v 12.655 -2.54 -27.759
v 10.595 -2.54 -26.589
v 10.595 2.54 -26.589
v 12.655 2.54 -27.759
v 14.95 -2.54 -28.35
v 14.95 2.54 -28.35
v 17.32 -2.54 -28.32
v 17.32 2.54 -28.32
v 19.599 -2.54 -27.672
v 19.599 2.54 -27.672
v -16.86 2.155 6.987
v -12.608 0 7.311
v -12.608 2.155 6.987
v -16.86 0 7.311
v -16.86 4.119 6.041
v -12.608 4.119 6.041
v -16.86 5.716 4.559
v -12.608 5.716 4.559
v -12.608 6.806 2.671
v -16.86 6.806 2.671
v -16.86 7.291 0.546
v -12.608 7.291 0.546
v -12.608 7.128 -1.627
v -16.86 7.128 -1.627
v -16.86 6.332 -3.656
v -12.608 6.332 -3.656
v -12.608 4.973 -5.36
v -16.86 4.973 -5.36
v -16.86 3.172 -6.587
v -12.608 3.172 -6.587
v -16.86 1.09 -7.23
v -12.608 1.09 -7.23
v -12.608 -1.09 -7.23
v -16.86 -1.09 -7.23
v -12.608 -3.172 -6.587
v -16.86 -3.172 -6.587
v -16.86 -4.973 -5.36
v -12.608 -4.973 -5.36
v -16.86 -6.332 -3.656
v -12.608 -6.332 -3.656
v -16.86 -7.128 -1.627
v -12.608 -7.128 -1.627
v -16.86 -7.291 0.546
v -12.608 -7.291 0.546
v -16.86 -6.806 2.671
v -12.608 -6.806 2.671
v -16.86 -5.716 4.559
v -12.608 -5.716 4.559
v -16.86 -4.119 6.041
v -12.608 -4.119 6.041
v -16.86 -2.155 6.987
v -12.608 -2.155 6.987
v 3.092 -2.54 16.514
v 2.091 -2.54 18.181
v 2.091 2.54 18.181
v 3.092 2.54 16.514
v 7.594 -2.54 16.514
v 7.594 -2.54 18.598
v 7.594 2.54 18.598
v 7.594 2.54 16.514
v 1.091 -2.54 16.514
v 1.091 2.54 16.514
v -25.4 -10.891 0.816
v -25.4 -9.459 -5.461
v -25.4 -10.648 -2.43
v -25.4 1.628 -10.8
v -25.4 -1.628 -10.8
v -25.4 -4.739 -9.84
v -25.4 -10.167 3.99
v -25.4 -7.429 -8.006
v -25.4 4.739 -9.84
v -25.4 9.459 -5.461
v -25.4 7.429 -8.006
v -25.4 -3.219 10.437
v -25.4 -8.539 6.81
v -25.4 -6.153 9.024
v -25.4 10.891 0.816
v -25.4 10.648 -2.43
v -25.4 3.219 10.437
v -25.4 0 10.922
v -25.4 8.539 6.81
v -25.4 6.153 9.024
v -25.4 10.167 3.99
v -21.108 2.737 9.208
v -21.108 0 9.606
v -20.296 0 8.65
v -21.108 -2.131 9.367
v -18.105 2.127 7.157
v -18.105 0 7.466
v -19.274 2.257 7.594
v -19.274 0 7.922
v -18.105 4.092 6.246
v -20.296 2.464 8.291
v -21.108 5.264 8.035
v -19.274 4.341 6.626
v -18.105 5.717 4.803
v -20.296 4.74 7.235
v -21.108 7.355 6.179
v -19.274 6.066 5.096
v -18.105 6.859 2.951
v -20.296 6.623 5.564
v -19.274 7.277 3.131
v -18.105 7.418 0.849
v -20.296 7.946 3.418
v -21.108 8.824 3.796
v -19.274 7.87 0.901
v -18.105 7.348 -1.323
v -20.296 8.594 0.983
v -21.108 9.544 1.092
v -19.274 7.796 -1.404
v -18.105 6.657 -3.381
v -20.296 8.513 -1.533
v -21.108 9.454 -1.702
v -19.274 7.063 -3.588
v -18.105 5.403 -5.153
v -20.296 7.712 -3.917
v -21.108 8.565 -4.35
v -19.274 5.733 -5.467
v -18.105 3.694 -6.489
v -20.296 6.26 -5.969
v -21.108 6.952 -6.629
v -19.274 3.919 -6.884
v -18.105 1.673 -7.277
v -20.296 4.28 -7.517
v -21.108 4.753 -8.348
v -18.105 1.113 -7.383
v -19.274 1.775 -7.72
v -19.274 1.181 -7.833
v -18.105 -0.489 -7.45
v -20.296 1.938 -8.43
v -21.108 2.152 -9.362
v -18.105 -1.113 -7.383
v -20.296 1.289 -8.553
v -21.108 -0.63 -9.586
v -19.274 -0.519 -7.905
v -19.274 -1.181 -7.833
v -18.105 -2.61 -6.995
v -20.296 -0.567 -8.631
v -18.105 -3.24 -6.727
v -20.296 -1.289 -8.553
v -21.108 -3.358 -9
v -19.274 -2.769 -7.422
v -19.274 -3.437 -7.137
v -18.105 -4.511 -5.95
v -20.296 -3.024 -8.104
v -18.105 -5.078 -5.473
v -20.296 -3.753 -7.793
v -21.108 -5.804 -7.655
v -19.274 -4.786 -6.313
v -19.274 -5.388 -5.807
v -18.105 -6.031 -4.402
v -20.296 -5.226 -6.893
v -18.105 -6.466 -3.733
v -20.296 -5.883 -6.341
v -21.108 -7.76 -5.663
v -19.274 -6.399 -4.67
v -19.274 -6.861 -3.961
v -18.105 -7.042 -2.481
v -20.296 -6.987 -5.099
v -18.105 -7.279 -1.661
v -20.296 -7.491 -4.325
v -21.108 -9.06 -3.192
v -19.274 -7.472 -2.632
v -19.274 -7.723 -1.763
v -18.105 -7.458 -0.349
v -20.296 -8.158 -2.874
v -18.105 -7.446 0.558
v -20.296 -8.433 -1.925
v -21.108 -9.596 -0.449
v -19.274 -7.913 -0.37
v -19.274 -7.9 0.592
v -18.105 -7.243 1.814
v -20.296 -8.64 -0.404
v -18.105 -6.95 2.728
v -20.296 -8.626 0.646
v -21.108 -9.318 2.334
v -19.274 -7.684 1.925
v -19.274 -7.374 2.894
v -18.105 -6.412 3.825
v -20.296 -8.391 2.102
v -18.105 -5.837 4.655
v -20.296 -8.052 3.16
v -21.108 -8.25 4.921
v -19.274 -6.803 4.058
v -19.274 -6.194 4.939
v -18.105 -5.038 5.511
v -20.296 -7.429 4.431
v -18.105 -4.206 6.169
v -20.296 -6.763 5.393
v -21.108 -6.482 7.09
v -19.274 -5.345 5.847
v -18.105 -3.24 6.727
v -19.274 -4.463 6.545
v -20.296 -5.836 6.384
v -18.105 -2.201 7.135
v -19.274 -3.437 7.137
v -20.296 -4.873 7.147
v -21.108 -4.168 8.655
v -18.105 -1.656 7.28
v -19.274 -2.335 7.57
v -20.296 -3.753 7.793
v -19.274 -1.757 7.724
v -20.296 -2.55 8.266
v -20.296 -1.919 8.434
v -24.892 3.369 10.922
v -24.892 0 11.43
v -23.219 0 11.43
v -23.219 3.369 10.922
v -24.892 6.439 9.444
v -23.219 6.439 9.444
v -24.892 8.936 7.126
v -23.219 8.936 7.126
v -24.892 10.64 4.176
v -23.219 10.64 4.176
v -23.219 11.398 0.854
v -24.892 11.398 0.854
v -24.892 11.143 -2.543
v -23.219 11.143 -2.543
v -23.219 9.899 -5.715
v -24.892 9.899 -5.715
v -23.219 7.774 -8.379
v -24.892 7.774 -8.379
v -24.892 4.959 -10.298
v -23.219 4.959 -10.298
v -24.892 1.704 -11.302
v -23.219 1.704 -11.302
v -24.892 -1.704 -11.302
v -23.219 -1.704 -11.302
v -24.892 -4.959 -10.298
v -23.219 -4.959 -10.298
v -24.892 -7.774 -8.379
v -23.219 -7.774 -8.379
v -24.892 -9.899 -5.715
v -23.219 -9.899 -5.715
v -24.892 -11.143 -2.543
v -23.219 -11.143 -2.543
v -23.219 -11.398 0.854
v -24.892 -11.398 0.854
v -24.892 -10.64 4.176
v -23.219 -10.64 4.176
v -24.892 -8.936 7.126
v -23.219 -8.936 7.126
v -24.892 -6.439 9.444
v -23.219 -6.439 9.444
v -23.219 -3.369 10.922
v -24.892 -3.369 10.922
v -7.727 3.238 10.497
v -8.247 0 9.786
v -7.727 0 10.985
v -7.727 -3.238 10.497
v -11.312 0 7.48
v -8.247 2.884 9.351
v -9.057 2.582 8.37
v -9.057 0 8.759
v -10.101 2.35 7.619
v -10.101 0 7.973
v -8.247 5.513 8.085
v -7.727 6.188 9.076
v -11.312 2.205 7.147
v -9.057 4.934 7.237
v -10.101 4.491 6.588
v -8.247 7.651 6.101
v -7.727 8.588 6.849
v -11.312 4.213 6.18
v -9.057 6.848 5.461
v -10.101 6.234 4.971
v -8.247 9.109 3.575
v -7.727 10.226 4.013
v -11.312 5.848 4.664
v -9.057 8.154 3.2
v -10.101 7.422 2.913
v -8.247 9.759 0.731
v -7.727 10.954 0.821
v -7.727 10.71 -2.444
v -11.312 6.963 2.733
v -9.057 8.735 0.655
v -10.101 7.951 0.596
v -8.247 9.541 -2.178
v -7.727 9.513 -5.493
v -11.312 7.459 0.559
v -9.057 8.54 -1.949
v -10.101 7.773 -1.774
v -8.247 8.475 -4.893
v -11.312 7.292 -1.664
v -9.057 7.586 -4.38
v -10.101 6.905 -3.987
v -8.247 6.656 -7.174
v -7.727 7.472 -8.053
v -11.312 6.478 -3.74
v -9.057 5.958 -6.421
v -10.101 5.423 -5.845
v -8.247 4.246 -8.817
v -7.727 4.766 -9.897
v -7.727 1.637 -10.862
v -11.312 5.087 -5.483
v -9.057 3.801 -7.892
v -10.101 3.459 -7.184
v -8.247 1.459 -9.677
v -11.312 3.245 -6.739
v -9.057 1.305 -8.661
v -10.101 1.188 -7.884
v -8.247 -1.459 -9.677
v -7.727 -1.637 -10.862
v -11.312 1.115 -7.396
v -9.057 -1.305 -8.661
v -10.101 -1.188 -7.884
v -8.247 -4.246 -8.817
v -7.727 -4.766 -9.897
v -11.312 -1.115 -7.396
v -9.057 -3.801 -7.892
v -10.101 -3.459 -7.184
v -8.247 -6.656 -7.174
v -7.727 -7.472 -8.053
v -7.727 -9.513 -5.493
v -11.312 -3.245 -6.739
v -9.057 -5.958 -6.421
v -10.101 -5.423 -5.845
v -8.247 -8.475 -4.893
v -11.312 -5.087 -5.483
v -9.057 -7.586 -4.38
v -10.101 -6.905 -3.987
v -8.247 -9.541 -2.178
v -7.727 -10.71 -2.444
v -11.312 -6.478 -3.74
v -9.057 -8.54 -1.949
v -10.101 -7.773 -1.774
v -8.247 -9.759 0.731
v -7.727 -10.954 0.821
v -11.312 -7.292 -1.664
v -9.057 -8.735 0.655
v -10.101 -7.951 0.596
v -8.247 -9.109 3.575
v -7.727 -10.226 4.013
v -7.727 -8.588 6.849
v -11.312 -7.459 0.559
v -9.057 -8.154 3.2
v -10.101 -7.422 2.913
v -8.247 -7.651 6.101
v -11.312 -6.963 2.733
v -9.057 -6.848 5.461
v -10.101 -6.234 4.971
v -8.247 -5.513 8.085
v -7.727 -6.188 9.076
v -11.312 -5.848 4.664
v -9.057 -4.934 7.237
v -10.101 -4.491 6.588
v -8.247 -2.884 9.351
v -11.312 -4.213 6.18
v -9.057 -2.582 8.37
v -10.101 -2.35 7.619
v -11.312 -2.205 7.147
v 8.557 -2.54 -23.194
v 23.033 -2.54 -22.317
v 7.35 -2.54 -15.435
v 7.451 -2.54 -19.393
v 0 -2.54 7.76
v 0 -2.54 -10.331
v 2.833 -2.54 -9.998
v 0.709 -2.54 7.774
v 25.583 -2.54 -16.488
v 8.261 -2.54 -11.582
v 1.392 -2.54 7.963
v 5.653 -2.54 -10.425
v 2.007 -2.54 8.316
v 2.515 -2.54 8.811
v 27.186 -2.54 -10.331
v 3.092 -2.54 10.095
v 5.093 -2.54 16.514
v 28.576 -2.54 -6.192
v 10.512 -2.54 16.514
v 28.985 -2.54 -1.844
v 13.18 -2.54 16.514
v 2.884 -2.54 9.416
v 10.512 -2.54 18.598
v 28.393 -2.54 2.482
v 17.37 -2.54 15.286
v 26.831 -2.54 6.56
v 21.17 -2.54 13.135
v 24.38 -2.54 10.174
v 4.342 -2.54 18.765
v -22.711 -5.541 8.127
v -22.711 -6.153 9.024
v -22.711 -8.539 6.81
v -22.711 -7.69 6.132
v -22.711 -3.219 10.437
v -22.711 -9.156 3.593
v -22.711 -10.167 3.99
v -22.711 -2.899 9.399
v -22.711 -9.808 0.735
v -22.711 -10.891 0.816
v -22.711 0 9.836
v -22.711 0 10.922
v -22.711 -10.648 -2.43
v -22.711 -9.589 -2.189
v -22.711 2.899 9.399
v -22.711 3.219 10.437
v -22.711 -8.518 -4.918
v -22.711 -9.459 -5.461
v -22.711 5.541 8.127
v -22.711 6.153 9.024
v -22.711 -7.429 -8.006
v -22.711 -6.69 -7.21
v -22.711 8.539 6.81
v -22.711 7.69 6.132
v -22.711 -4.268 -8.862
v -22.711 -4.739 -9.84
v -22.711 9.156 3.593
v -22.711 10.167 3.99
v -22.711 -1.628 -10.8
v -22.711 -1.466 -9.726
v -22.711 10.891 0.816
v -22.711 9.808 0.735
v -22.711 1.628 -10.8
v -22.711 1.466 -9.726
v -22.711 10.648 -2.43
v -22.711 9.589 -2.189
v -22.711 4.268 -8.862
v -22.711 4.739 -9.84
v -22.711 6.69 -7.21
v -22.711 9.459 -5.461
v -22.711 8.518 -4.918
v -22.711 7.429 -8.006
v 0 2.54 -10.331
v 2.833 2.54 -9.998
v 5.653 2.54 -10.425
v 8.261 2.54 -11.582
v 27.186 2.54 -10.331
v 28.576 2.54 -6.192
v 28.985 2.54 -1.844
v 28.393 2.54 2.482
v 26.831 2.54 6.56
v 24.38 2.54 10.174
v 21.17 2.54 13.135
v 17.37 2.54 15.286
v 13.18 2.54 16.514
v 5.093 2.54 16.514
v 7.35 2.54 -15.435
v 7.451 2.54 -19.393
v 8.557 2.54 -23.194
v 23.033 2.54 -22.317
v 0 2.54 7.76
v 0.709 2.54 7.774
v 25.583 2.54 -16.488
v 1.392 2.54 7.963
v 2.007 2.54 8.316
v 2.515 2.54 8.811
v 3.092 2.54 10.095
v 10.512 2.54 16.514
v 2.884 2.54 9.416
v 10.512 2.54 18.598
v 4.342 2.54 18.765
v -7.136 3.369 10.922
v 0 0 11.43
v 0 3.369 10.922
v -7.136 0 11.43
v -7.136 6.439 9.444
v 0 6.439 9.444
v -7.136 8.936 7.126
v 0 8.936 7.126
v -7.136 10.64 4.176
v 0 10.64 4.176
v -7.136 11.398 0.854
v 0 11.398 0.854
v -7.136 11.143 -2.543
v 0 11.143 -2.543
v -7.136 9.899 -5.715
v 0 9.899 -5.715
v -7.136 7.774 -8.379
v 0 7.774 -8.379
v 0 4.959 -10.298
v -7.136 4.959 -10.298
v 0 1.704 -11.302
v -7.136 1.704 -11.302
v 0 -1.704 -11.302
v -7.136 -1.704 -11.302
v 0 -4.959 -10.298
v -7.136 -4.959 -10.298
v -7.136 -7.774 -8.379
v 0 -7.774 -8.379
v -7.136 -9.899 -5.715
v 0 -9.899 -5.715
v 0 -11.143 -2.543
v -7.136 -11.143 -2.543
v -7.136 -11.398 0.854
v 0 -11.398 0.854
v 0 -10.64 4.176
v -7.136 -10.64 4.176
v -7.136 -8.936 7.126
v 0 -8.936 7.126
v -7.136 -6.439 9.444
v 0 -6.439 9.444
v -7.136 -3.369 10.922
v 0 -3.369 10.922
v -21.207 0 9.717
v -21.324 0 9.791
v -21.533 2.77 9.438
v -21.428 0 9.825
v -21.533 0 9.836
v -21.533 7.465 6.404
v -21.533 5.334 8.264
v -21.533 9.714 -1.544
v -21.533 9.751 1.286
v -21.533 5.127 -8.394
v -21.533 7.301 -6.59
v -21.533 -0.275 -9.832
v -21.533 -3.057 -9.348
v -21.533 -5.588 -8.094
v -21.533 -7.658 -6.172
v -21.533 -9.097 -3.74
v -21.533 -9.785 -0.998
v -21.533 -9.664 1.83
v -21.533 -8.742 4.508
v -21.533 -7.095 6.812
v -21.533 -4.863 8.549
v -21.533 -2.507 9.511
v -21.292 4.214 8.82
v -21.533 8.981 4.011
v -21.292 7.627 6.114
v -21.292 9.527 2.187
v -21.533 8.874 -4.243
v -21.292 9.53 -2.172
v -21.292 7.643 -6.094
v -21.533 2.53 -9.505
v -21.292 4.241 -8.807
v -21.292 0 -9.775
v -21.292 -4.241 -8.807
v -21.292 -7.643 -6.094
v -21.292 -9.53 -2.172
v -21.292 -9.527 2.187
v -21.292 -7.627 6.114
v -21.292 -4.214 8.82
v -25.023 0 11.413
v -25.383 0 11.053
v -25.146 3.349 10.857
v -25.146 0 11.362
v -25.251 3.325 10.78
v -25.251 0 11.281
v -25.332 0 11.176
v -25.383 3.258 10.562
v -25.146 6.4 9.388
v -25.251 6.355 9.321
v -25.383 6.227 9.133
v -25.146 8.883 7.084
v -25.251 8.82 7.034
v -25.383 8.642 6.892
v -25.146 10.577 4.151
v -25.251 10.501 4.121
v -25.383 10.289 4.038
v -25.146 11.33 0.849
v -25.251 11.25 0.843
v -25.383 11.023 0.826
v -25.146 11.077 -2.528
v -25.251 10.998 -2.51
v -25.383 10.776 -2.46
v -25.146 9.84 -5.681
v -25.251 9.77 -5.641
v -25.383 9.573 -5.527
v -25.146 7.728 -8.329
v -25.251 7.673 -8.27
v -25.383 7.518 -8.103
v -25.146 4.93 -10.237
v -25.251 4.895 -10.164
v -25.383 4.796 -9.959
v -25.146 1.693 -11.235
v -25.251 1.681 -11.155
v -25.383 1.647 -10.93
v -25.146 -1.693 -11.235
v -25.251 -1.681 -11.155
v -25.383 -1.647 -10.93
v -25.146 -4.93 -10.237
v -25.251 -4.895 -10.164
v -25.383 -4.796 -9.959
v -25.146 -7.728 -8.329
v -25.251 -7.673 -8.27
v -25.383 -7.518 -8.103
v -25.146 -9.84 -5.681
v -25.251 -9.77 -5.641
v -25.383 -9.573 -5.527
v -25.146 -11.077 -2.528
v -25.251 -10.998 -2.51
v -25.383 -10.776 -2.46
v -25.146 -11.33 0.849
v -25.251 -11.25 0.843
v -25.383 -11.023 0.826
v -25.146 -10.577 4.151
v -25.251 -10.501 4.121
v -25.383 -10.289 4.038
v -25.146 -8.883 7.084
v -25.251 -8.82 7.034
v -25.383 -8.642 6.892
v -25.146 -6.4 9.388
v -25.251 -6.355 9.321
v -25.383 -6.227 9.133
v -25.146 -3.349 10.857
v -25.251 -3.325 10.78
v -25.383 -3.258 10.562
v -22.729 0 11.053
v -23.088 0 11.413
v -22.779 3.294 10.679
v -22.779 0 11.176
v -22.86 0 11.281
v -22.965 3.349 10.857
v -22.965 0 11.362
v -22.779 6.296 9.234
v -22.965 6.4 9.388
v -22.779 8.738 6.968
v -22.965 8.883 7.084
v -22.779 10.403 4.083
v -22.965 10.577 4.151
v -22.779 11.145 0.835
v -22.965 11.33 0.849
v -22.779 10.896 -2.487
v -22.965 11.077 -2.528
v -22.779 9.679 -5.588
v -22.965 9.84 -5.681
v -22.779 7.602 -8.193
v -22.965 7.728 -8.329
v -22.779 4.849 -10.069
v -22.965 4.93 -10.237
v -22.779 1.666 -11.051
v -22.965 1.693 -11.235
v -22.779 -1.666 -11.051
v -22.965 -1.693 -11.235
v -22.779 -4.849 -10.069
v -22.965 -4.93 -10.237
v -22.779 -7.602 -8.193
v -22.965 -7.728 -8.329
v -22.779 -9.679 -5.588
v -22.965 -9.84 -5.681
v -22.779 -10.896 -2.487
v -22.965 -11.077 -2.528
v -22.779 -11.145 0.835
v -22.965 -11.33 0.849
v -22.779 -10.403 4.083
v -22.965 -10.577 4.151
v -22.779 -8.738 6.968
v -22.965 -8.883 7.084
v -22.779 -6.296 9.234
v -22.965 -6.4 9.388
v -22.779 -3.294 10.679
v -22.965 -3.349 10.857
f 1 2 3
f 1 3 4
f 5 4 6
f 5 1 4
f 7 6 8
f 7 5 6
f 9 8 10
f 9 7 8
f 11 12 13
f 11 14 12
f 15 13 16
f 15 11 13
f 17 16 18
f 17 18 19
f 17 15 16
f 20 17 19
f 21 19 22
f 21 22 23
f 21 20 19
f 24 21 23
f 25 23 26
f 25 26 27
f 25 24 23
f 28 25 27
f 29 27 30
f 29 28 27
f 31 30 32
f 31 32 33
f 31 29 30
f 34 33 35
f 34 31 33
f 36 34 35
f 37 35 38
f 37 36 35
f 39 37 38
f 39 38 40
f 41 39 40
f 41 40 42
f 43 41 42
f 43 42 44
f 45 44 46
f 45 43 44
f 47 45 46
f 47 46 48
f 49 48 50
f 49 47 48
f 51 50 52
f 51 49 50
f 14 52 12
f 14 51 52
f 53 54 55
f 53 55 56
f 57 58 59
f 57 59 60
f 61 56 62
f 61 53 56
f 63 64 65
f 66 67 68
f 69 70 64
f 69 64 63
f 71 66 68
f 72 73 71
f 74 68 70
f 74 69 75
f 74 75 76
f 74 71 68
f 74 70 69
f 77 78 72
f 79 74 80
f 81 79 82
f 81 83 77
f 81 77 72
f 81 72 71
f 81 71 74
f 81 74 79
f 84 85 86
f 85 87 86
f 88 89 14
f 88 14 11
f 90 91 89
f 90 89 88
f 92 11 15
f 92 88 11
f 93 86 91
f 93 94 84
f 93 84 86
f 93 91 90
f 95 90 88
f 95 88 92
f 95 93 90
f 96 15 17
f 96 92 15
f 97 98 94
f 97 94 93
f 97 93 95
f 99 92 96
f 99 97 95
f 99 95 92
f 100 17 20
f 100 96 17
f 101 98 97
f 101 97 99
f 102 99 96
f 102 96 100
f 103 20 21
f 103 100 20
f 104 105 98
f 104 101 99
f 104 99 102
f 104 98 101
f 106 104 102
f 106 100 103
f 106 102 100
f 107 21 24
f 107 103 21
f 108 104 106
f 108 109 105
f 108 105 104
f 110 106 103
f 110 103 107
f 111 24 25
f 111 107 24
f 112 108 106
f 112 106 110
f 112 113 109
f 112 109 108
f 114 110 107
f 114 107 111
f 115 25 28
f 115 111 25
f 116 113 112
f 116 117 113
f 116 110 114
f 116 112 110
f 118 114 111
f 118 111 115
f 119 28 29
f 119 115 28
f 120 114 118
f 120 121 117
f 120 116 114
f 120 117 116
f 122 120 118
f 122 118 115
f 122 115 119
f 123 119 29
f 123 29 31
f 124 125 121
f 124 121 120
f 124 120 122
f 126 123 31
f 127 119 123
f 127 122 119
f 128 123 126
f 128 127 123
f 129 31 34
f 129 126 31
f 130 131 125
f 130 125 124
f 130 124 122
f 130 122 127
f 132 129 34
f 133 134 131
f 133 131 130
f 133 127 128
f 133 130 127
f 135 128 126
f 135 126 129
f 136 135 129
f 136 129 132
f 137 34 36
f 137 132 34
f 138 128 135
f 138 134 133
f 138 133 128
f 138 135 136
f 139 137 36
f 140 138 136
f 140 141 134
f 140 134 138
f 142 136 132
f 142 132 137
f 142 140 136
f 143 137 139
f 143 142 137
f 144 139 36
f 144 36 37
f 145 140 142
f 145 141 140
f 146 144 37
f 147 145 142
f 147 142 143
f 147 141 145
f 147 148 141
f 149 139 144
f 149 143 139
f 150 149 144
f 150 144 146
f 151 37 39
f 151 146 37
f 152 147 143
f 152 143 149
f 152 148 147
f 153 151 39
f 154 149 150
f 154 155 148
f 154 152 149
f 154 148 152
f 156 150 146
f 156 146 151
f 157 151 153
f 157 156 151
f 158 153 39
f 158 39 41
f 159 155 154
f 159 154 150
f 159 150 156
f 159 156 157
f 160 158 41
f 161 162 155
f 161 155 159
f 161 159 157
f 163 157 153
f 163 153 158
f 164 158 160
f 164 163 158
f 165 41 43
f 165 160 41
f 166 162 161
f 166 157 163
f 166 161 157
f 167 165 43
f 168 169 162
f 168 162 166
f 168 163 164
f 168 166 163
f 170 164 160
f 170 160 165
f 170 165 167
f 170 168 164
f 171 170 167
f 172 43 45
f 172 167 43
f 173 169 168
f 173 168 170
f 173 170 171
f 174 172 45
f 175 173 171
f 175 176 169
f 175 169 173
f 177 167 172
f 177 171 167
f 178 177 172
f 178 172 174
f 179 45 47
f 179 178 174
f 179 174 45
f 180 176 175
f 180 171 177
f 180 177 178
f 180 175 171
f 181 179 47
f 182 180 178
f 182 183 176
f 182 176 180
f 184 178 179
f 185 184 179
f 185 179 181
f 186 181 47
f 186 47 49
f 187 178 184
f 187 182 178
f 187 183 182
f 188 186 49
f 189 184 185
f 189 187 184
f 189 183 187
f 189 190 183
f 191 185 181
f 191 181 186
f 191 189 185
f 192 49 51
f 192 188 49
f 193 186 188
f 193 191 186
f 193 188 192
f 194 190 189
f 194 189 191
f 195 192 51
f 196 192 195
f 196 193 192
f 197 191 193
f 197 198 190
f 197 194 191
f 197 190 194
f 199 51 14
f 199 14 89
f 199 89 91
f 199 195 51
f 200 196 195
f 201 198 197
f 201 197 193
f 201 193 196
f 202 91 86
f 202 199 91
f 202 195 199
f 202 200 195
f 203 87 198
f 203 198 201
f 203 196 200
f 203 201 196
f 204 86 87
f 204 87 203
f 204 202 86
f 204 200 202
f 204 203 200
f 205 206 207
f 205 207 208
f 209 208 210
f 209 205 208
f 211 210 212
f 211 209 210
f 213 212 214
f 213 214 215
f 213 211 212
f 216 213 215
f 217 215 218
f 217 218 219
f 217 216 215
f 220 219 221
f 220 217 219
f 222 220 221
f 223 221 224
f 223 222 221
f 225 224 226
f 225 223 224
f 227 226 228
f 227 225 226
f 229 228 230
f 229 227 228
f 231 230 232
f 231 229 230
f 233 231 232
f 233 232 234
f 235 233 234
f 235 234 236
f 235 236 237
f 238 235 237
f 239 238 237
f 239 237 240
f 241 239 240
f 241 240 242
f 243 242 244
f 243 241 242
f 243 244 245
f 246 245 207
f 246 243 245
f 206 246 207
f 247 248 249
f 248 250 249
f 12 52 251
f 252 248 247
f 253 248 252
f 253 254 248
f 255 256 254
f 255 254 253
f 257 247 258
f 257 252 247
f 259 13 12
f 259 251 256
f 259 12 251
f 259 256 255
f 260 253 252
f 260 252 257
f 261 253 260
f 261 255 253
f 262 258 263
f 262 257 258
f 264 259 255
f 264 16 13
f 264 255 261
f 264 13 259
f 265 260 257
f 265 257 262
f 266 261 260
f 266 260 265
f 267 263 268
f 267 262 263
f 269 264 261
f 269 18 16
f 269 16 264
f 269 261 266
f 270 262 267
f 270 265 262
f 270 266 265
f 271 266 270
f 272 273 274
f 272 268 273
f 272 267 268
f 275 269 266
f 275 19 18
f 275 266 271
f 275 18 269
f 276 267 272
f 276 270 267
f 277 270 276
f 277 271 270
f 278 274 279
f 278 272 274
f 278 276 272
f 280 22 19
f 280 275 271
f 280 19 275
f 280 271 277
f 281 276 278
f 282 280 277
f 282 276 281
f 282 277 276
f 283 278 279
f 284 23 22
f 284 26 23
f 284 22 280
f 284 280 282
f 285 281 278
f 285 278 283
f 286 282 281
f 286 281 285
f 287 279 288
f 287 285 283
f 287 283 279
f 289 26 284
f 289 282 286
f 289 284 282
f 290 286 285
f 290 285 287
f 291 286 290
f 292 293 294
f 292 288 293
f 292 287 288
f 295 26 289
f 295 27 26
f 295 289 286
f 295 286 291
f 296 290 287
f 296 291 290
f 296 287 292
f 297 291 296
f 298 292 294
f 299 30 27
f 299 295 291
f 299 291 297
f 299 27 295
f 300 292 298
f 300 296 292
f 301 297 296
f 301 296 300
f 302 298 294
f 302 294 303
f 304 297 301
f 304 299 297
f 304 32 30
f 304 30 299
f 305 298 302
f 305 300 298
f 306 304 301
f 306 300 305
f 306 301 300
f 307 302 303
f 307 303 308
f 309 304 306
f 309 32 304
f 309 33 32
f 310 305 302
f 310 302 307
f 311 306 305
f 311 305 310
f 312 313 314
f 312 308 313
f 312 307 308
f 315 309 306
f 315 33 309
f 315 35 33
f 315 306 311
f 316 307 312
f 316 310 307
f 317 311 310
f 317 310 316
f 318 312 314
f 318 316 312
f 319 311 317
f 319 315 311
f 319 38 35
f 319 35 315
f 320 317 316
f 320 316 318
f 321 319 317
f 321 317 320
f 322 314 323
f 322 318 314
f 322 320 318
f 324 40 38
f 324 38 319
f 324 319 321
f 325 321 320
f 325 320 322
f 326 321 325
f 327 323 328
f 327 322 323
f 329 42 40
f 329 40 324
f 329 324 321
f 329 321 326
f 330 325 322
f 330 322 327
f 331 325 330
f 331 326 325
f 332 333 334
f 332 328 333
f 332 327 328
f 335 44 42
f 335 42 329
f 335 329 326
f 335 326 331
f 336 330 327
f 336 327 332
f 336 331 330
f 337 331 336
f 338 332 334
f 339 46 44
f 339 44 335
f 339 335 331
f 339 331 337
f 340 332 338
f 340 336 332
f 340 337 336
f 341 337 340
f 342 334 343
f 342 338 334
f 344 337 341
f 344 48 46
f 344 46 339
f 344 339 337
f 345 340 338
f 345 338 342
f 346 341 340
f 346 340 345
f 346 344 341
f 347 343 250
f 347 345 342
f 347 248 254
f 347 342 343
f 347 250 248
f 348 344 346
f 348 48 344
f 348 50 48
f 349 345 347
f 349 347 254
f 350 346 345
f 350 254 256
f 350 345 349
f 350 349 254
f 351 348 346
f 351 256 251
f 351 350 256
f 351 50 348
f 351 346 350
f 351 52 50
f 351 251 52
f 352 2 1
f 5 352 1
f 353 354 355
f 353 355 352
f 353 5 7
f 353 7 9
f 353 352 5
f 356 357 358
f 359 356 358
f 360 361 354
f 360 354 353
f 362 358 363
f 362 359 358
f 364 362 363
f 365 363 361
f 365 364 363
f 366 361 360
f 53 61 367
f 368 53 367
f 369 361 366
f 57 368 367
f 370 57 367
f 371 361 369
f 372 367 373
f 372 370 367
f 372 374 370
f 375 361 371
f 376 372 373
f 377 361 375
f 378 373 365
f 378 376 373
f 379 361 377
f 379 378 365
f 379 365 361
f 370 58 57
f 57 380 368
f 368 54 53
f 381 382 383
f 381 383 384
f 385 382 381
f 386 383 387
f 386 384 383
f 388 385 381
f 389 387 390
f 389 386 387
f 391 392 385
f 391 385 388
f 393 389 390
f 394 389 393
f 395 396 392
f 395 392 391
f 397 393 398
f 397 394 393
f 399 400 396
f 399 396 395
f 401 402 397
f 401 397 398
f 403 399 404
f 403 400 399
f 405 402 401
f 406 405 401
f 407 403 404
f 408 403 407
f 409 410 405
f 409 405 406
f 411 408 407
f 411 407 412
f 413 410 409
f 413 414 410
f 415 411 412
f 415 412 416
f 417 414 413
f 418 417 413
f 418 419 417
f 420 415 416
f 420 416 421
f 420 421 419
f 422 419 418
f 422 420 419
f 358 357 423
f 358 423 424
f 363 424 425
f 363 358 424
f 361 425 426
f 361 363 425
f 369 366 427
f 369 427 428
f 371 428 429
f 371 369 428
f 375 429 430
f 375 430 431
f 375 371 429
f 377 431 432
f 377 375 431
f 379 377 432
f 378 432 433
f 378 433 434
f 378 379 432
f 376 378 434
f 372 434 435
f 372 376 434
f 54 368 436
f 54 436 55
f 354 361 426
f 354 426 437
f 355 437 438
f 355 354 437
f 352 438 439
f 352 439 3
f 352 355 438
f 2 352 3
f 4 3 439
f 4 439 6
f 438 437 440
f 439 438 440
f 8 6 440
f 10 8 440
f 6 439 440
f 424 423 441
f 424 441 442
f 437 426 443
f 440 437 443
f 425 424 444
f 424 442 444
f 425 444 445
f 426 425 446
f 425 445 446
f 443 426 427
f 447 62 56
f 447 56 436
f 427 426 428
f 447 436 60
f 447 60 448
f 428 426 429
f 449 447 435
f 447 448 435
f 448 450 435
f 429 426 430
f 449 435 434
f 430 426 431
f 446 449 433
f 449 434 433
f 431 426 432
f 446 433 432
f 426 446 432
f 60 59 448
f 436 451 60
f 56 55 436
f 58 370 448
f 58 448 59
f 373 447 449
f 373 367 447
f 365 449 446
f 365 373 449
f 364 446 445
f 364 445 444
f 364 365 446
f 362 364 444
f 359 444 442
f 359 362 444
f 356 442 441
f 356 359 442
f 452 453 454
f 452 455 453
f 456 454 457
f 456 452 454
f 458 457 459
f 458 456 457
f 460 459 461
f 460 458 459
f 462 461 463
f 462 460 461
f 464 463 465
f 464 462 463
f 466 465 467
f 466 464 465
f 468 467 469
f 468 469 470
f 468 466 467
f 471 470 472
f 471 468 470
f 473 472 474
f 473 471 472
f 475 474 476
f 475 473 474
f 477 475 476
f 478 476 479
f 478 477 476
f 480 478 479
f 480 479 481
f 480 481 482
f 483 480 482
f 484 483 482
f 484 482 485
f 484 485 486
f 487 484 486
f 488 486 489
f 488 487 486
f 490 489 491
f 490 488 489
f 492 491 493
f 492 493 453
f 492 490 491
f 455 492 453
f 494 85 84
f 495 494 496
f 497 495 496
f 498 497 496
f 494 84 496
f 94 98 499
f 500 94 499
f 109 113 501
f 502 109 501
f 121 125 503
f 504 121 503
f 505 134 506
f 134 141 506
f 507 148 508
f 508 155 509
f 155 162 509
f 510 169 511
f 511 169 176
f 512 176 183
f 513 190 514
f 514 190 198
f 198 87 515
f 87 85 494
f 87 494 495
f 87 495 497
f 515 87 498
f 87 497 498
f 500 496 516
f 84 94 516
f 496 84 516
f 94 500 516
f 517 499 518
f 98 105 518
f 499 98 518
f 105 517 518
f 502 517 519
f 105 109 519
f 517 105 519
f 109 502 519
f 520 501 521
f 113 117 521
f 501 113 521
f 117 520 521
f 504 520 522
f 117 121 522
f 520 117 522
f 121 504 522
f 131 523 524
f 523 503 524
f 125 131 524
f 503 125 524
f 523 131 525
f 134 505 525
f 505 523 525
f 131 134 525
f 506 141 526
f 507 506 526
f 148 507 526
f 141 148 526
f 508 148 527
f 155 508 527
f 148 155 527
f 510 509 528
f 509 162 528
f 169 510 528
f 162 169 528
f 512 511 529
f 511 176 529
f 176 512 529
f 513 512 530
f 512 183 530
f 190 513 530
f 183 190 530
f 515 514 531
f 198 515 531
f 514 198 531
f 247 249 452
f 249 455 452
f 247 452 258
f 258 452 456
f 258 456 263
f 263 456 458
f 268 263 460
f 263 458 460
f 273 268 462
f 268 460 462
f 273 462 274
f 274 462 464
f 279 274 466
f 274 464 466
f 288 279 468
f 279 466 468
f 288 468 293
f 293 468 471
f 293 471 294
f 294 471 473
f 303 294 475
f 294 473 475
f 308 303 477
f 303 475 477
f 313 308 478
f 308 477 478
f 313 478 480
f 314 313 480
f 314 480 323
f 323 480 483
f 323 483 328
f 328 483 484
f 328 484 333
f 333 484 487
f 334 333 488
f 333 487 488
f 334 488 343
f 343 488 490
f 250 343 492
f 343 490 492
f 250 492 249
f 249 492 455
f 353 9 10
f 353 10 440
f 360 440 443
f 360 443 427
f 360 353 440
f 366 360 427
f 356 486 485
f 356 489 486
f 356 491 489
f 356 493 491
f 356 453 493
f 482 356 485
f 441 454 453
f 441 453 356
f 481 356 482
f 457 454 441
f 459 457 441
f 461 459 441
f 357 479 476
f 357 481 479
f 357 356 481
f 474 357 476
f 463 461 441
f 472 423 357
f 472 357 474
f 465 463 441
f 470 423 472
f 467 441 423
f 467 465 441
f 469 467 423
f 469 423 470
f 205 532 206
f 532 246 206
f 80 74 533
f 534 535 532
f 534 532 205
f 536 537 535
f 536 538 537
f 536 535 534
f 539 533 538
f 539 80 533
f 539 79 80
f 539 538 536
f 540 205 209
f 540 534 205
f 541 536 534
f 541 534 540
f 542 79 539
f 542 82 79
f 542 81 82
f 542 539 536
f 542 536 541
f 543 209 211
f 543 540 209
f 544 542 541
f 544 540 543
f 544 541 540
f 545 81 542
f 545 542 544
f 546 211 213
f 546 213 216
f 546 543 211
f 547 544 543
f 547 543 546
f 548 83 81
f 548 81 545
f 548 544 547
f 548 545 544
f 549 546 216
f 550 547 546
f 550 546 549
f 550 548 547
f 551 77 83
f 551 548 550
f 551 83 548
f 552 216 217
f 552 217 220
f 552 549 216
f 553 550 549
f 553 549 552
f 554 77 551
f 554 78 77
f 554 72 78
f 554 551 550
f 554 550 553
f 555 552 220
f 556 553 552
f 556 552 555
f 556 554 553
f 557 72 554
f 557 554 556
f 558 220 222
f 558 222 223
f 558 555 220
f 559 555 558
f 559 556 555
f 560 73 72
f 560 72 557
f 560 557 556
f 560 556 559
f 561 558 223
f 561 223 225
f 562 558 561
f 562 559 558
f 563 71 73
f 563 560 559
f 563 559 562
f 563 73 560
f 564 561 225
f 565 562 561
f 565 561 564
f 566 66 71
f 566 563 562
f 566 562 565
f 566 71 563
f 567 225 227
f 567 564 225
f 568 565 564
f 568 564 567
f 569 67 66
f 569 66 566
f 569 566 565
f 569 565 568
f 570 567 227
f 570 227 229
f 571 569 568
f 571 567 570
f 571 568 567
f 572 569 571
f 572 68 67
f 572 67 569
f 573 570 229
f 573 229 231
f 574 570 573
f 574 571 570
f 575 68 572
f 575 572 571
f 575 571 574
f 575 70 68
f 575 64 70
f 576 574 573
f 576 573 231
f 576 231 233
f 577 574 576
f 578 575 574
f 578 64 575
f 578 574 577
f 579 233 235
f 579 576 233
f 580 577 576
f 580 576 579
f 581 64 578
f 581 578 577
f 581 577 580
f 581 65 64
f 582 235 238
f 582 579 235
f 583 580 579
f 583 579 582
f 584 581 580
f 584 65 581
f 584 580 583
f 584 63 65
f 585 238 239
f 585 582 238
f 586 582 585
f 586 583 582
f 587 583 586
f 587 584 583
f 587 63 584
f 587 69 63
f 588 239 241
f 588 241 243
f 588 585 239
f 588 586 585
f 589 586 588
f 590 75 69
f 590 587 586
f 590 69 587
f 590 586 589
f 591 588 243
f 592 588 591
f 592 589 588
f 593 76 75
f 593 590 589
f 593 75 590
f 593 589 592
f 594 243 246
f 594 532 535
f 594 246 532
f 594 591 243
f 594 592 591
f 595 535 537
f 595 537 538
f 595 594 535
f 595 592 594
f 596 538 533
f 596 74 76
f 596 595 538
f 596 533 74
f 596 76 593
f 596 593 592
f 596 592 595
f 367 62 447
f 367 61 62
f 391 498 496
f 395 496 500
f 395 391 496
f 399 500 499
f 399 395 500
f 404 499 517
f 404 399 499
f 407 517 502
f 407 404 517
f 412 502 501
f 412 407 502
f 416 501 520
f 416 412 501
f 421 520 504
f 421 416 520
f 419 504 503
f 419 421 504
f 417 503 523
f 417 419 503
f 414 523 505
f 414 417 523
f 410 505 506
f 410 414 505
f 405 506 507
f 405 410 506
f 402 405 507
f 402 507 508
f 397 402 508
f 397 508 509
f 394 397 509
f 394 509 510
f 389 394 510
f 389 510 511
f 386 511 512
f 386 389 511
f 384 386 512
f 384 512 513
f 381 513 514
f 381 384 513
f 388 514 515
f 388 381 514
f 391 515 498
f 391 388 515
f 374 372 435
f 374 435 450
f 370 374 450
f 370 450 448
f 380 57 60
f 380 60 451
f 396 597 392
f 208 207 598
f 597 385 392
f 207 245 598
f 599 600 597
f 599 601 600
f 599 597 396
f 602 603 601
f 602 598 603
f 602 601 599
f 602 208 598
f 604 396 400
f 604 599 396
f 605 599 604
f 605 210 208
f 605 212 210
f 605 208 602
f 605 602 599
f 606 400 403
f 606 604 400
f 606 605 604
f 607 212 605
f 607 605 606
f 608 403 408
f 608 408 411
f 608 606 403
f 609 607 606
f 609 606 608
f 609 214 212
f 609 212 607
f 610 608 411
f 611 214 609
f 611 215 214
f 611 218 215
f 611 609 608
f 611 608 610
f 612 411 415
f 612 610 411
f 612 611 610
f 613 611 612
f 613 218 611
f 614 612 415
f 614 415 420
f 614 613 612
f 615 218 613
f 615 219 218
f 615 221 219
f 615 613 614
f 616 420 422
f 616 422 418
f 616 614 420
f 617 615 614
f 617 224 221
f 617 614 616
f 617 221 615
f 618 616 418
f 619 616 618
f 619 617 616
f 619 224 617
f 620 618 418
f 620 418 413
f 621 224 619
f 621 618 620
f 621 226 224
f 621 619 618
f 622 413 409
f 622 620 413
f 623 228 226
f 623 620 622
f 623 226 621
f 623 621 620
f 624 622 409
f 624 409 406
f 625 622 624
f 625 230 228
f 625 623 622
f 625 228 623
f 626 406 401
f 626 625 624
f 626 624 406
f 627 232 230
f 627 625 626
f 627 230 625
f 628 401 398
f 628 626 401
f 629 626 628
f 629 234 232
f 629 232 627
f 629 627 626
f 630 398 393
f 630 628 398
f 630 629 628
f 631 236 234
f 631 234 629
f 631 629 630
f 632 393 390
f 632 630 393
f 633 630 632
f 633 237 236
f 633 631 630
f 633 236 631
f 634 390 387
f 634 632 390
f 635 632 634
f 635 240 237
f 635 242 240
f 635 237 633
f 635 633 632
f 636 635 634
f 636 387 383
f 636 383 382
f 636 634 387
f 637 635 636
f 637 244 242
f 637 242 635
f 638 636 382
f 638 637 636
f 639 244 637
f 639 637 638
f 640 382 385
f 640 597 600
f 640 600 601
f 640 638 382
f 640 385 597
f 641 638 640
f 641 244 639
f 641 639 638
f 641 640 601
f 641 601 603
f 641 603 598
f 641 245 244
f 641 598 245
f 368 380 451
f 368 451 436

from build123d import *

# Parameters (mm, degrees)
F4_R     = 0.508
F7_DEPTH = 2.54


# Not quite as in the source:
# - a fillet or chamfer that OpenCascade refuses, or shapes differently, is made with other operations: its cross-section is extruded or revolved along the edge and cut away or added


with BuildPart() as f1:
    # F0 (on Front) → F1 (revolve)
    with BuildSketch(Plane.XZ):
        Polygon((-25.4, 0), (0, 0), (0, 11.43), (-7.62, 11.43), (-7.62, 7.3114731075), (-20.32, 7.3114731075), (-21.2499899719, 9.835730216), (-22.7114037935, 9.835730216), (-22.7114037935, 11.43), (-25.4, 11.43), align=None)
    revolve(axis=Axis((-12.7, 0, 0), (-1, 0, 0)))

    # F2: fillet of radius 5.08 on 1 edges, made by hand

    # F2_s1 → F2_t2 (revolve)
    with BuildSketch(Plane.XZ):
        with BuildLine():
            ThreePointArc((-16.8597077176, 7.3114731075), (-19.3918240371, 7.9875218198), (-21.2499899719, 9.835730216))
            Line((-21.2499899719, 9.835730216), (-20.32, 7.3114731075))
            Line((-20.32, 7.3114731075), (-16.8597077176, 7.3114731075))
        make_face()
    revolve(axis=Axis((-20.32, 0, 0), (-1, 0, 0)))

    # F3: fillet of radius 5.08 on 1 edges, made by hand

    # F3_s1 → F3_t2 (revolve)
    with BuildSketch(Plane.XZ):
        with BuildLine():
            ThreePointArc((-7.62, 11.43), (-9.3738270483, 8.4741600369), (-12.6081829822, 7.3114731075))
            Line((-12.6081829822, 7.3114731075), (-7.62, 7.3114731075))
            Line((-7.62, 7.3114731075), (-7.62, 11.43))
        make_face()
    revolve(axis=Axis((-7.62, 0, 0), (-1, 0, 0)))

    # F4
    f4_edges = [f1.edges().sort_by_distance(p)[0] for p in [
        (-21.24999, 0, -9.83573),
        (-22.711404, 0, -11.43),
        (-25.4, 0, -11.43),
    ]]
    fillet(f4_edges, radius=F4_R)

    # F5: chamfer of 0.508 on 1 edges, made by hand

    # F5_s1 → F5_t2 (revolve, cut)
    with BuildSketch(Plane.XZ):
        with BuildLine():
            Line((-7.7429817287, 10.9728511125), (-7.1192910196, 11.442218632))
            Line((-7.1192910196, 11.442218632), (-7.1192910196, 11.452378632))
            ThreePointArc((-7.1192910196, 11.452378632), (-7.3696455098, 11.44016), (-7.62, 11.44016))
            Line((-7.62, 11.44016), (-7.629976366, 11.4319229462))
            ThreePointArc((-7.629976366, 11.4319229462), (-7.6800748035, 11.2010835053), (-7.7527446032, 10.9756639192))
            Line((-7.7527446032, 10.9756639192), (-7.7429817287, 10.9728511125))
        make_face()
    revolve(axis=Axis((-7.62, 0, 0), (-1, 0, 0)), mode=Mode.SUBTRACT)

    # F6 (on Front) → F7 (join, symmetric)
    with BuildSketch(Plane.XZ):
        with BuildLine():
            ThreePointArc((3.0916559044, 10.094515048), (2.0073718485, 8.3160562532), (0, 7.7601373196))
            Line((0, 7.7601373196), (0, -10.331296362))
            ThreePointArc((0, -10.331296362), (4.2573596526, -10.1174017701), (8.2606375217, -11.5818567574))
            ThreePointArc((8.2606375217, -11.5818567574), (7.4512752544, -19.3926799341), (10.5950161815, -26.5885759145))
            ThreePointArc((10.5950161815, -26.5885759145), (14.9502413437, -28.3499722326), (19.5990465581, -27.6723932475))
            ThreePointArc((19.5990465581, -27.6723932475), (24.422816729, -19.452646971), (27.1857772022, -10.331296362))
            ThreePointArc((27.1857772022, -10.331296362), (26.8307486913, 6.5599572314), (13.1795061752, 16.5140554309))
            Line((13.1795061752, 16.5140554309), (10.5116451159, 18.5983236879))
            Line((10.5116451159, 18.5983236879), (10.5116451159, 16.5140554309))
            Line((10.5116451159, 16.5140554309), (7.5936717913, 18.5983236879))
            Line((7.5936717913, 18.5983236879), (7.5936717913, 16.5140554309))
            Line((7.5936717913, 16.5140554309), (4.342216067, 18.7650639564))
            Line((4.342216067, 18.7650639564), (5.0925519317, 16.5140554309))
            Line((5.0925519317, 16.5140554309), (2.0912080654, 18.1814711541))
            Line((2.0912080654, 18.1814711541), (3.0916559044, 16.5140554309))
            Line((3.0916559044, 16.5140554309), (1.0907602264, 16.5140554309))
            Line((1.0907602264, 16.5140554309), (3.0916559044, 10.094515048))
        make_face()
    extrude(amount=F7_DEPTH, both=True)


solid = f1.part
